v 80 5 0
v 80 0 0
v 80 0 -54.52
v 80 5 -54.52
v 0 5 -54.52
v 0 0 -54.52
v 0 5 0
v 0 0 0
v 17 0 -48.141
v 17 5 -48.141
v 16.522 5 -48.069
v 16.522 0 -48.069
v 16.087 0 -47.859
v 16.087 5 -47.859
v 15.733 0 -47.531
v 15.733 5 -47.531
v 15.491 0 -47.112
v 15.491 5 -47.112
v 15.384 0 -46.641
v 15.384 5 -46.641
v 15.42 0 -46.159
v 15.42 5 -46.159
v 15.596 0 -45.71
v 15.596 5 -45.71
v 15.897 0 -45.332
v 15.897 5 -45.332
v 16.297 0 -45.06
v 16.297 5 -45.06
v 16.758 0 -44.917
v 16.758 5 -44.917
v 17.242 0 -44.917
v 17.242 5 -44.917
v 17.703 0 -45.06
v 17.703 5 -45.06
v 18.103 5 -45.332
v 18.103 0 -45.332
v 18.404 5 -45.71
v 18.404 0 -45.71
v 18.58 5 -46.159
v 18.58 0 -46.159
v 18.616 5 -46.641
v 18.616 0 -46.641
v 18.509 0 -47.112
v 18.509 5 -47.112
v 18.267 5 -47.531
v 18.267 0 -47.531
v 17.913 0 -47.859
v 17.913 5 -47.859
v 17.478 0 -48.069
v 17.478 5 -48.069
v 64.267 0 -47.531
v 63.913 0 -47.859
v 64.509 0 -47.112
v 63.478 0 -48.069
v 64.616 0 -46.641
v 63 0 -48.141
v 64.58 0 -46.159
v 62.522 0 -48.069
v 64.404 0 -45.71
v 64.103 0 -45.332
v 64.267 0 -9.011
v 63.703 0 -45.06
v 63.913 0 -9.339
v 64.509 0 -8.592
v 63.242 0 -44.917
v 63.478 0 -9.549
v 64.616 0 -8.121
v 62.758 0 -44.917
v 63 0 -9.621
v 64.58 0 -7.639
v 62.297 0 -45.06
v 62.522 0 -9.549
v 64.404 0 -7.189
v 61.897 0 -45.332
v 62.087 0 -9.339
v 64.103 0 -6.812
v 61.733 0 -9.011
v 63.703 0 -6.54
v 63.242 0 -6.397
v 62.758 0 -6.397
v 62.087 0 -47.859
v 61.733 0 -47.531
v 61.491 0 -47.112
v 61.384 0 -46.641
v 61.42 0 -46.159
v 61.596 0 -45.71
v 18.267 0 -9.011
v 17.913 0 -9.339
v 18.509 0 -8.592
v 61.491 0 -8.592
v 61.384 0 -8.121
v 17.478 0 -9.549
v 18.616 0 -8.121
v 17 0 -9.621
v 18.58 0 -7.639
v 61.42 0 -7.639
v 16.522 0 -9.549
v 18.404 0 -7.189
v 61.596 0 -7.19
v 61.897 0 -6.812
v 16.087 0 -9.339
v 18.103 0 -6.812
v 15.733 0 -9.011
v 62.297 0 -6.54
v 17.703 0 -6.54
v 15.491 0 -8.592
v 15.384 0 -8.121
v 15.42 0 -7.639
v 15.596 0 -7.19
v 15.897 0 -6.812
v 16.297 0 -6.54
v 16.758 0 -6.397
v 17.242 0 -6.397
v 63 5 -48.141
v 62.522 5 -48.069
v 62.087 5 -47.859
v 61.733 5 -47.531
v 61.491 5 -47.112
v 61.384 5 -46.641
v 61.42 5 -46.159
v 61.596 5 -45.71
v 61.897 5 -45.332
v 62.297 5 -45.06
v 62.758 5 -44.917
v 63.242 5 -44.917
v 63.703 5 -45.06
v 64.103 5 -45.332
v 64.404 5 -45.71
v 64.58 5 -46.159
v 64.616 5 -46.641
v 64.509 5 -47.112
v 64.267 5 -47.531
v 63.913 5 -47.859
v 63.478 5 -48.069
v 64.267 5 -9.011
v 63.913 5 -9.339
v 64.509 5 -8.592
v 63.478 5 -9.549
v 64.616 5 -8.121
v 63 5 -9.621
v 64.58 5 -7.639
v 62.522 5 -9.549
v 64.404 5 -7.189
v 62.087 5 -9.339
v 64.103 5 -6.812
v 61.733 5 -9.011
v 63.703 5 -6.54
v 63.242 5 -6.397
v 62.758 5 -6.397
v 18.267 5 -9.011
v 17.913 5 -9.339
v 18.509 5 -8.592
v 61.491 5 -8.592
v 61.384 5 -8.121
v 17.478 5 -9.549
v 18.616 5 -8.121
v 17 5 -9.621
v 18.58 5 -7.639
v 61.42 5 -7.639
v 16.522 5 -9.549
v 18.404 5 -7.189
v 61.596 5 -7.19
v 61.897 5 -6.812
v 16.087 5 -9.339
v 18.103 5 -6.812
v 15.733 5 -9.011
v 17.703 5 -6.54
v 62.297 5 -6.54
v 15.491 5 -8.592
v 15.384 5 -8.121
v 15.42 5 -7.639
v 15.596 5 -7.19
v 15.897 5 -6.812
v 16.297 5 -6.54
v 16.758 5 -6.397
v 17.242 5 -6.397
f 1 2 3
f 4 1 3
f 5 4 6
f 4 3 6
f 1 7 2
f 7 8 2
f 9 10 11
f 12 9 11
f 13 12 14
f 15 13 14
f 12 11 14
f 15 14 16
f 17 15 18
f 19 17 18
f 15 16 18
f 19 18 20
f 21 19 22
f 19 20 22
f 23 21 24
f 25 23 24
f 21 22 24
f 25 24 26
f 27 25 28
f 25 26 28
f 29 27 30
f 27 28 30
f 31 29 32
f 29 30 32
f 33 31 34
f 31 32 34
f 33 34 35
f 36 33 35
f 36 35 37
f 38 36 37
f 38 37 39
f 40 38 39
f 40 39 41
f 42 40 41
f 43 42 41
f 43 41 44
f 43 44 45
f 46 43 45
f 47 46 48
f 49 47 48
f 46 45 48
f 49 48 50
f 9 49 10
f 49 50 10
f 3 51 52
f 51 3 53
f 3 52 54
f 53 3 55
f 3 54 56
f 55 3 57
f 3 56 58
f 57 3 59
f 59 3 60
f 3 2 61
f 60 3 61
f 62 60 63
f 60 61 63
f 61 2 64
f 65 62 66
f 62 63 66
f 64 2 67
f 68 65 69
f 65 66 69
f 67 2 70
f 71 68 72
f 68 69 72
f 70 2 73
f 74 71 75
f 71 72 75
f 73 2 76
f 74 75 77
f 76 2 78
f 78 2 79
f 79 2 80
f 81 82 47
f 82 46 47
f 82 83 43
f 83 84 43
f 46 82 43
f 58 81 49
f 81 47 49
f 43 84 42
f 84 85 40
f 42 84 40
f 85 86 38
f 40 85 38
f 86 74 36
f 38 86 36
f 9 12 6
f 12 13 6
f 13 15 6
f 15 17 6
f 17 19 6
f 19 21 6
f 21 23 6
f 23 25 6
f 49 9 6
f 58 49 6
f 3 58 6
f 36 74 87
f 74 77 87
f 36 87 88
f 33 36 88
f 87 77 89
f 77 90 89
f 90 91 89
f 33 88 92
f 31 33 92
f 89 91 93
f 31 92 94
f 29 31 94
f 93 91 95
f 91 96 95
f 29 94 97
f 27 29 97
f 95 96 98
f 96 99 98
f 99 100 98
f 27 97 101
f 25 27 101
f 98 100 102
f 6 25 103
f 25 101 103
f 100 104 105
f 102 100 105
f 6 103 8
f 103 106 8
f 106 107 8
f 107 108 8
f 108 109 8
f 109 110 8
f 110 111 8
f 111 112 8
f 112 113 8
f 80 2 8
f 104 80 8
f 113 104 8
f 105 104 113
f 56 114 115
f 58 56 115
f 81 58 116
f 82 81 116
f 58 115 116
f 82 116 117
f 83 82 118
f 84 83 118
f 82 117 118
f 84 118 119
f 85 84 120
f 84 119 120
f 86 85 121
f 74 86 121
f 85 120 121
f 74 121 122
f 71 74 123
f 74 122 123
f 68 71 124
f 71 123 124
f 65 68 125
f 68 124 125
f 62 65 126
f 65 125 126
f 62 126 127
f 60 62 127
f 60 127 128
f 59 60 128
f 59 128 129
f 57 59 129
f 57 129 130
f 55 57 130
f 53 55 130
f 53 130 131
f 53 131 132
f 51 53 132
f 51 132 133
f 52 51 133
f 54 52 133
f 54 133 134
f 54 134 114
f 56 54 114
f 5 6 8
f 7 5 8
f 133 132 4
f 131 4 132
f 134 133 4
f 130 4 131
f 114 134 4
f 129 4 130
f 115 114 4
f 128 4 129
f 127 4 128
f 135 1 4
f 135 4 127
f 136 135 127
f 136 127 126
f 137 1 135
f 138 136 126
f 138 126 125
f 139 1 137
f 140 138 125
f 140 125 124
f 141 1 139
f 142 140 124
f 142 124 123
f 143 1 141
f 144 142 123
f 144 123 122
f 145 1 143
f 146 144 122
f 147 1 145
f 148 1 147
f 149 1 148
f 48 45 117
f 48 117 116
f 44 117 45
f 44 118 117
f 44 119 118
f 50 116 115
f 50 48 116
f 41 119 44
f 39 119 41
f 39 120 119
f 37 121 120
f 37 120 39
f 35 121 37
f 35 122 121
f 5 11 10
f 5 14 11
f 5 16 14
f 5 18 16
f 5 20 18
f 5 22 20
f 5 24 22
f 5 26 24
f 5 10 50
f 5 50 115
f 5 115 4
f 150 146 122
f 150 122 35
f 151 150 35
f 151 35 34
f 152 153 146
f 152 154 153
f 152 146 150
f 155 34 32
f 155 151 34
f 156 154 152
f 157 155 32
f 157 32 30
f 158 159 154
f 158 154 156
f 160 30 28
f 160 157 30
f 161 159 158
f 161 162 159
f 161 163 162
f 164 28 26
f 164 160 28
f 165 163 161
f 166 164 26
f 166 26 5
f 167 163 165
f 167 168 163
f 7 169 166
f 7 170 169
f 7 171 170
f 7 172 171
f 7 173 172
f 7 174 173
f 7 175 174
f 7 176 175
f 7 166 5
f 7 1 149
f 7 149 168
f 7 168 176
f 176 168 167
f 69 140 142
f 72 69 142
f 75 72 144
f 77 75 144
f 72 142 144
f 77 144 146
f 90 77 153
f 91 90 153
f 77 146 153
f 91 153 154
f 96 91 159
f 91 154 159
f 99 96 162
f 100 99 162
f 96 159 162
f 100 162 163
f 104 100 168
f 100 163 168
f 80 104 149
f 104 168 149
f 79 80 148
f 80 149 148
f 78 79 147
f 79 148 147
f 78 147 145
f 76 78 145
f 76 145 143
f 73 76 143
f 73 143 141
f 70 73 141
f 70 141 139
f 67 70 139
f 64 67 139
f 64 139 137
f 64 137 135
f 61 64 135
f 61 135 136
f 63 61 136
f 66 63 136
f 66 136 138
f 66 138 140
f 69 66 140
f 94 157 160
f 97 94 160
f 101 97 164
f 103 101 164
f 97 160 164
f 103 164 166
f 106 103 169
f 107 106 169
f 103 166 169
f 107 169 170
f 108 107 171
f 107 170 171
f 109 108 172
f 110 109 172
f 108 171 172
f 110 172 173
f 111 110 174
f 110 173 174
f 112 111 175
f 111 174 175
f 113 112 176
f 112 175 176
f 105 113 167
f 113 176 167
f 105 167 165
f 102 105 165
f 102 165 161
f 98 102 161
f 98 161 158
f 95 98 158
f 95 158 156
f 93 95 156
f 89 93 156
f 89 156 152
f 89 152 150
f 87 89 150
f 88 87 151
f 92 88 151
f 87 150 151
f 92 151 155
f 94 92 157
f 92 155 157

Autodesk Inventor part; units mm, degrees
ref_plane "YZ Plane" through (0, 0, 0) normal (1, 0, 0) x (0, 1, 0)
ref_plane "XZ Plane" through (0, 0, 0) normal (0, 1, 0) x (-1, 0, 0)
ref_plane "XY Plane" through (0, 0, 0) normal (0, 0, 1) x (1, 0, 0)
sketch "Boceto1" plane through (0, 0, 0) normal (0, 1, 0) x (-1, 0, 0)
  line L0 (0, 0) -> (-80, 0)
  line L1 (-80, 0) -> (-80, -54.52)
  line L2 (-80, -54.52) -> (0, -54.52)
  line L3 (0, -54.52) -> (0, 0)
  line L4 (-80, -54.52) -> (-63, -54.52) construction
  line L5 (-63, -54.52) -> (-63, -46.52) construction
  line L6 (-63, 0) -> (-63, -8) construction
  line L7 (0, -54.52) -> (-17, -54.52) construction
  line L8 (-17, -54.52) -> (-17, -46.52) construction
  line L9 (-17, 0) -> (-17, -8) construction
  dimension "d0" = 80
  dimension "d1" = 54.52
  dimension "d2" = 17
  dimension "d3" = 8
  dimension "d6" = 8
  dimension "d7" = 17
extrude "Extrusión1" add sketch "Boceto1" along normal blind 5
hole "Agujero2" at (63, 0, -46.52) direction (0, 1, 0) diameter 3.242 end through all thread size "M4x0.7" class "6H" standard "ANSI Metric M Profile"
hole "Agujero3" at (17, 0, -46.52) at (63, 0, -8) at (17, 0, -8) direction (0, 1, 0) diameter 3.242 end through all thread size "M4x0.7" class "6H" standard "ANSI Metric M Profile"
equation "\"Radio_pliegue\" = Grosor"
equation "\"Anchura_desahogo_plegado\" = Grosor"
equation "\"Profundidad_desahogo_plegado\" = 0.5 * Grosor"
equation "\"Tamaño_destalonado\" = 4 * Grosor"
equation "\"Remanente_mínimo\" = 2 * Grosor"
equation "\"Radiodetransición\" = Radio_pliegue"
equation "\"Tamaño_de_radio_de_Jacobi\" = Radio_pliegue"
equation "\"TamañoSeparación\" = Grosor"
equation "\"Grosor\" = 0.5"
properties part number "practica 13.2"
